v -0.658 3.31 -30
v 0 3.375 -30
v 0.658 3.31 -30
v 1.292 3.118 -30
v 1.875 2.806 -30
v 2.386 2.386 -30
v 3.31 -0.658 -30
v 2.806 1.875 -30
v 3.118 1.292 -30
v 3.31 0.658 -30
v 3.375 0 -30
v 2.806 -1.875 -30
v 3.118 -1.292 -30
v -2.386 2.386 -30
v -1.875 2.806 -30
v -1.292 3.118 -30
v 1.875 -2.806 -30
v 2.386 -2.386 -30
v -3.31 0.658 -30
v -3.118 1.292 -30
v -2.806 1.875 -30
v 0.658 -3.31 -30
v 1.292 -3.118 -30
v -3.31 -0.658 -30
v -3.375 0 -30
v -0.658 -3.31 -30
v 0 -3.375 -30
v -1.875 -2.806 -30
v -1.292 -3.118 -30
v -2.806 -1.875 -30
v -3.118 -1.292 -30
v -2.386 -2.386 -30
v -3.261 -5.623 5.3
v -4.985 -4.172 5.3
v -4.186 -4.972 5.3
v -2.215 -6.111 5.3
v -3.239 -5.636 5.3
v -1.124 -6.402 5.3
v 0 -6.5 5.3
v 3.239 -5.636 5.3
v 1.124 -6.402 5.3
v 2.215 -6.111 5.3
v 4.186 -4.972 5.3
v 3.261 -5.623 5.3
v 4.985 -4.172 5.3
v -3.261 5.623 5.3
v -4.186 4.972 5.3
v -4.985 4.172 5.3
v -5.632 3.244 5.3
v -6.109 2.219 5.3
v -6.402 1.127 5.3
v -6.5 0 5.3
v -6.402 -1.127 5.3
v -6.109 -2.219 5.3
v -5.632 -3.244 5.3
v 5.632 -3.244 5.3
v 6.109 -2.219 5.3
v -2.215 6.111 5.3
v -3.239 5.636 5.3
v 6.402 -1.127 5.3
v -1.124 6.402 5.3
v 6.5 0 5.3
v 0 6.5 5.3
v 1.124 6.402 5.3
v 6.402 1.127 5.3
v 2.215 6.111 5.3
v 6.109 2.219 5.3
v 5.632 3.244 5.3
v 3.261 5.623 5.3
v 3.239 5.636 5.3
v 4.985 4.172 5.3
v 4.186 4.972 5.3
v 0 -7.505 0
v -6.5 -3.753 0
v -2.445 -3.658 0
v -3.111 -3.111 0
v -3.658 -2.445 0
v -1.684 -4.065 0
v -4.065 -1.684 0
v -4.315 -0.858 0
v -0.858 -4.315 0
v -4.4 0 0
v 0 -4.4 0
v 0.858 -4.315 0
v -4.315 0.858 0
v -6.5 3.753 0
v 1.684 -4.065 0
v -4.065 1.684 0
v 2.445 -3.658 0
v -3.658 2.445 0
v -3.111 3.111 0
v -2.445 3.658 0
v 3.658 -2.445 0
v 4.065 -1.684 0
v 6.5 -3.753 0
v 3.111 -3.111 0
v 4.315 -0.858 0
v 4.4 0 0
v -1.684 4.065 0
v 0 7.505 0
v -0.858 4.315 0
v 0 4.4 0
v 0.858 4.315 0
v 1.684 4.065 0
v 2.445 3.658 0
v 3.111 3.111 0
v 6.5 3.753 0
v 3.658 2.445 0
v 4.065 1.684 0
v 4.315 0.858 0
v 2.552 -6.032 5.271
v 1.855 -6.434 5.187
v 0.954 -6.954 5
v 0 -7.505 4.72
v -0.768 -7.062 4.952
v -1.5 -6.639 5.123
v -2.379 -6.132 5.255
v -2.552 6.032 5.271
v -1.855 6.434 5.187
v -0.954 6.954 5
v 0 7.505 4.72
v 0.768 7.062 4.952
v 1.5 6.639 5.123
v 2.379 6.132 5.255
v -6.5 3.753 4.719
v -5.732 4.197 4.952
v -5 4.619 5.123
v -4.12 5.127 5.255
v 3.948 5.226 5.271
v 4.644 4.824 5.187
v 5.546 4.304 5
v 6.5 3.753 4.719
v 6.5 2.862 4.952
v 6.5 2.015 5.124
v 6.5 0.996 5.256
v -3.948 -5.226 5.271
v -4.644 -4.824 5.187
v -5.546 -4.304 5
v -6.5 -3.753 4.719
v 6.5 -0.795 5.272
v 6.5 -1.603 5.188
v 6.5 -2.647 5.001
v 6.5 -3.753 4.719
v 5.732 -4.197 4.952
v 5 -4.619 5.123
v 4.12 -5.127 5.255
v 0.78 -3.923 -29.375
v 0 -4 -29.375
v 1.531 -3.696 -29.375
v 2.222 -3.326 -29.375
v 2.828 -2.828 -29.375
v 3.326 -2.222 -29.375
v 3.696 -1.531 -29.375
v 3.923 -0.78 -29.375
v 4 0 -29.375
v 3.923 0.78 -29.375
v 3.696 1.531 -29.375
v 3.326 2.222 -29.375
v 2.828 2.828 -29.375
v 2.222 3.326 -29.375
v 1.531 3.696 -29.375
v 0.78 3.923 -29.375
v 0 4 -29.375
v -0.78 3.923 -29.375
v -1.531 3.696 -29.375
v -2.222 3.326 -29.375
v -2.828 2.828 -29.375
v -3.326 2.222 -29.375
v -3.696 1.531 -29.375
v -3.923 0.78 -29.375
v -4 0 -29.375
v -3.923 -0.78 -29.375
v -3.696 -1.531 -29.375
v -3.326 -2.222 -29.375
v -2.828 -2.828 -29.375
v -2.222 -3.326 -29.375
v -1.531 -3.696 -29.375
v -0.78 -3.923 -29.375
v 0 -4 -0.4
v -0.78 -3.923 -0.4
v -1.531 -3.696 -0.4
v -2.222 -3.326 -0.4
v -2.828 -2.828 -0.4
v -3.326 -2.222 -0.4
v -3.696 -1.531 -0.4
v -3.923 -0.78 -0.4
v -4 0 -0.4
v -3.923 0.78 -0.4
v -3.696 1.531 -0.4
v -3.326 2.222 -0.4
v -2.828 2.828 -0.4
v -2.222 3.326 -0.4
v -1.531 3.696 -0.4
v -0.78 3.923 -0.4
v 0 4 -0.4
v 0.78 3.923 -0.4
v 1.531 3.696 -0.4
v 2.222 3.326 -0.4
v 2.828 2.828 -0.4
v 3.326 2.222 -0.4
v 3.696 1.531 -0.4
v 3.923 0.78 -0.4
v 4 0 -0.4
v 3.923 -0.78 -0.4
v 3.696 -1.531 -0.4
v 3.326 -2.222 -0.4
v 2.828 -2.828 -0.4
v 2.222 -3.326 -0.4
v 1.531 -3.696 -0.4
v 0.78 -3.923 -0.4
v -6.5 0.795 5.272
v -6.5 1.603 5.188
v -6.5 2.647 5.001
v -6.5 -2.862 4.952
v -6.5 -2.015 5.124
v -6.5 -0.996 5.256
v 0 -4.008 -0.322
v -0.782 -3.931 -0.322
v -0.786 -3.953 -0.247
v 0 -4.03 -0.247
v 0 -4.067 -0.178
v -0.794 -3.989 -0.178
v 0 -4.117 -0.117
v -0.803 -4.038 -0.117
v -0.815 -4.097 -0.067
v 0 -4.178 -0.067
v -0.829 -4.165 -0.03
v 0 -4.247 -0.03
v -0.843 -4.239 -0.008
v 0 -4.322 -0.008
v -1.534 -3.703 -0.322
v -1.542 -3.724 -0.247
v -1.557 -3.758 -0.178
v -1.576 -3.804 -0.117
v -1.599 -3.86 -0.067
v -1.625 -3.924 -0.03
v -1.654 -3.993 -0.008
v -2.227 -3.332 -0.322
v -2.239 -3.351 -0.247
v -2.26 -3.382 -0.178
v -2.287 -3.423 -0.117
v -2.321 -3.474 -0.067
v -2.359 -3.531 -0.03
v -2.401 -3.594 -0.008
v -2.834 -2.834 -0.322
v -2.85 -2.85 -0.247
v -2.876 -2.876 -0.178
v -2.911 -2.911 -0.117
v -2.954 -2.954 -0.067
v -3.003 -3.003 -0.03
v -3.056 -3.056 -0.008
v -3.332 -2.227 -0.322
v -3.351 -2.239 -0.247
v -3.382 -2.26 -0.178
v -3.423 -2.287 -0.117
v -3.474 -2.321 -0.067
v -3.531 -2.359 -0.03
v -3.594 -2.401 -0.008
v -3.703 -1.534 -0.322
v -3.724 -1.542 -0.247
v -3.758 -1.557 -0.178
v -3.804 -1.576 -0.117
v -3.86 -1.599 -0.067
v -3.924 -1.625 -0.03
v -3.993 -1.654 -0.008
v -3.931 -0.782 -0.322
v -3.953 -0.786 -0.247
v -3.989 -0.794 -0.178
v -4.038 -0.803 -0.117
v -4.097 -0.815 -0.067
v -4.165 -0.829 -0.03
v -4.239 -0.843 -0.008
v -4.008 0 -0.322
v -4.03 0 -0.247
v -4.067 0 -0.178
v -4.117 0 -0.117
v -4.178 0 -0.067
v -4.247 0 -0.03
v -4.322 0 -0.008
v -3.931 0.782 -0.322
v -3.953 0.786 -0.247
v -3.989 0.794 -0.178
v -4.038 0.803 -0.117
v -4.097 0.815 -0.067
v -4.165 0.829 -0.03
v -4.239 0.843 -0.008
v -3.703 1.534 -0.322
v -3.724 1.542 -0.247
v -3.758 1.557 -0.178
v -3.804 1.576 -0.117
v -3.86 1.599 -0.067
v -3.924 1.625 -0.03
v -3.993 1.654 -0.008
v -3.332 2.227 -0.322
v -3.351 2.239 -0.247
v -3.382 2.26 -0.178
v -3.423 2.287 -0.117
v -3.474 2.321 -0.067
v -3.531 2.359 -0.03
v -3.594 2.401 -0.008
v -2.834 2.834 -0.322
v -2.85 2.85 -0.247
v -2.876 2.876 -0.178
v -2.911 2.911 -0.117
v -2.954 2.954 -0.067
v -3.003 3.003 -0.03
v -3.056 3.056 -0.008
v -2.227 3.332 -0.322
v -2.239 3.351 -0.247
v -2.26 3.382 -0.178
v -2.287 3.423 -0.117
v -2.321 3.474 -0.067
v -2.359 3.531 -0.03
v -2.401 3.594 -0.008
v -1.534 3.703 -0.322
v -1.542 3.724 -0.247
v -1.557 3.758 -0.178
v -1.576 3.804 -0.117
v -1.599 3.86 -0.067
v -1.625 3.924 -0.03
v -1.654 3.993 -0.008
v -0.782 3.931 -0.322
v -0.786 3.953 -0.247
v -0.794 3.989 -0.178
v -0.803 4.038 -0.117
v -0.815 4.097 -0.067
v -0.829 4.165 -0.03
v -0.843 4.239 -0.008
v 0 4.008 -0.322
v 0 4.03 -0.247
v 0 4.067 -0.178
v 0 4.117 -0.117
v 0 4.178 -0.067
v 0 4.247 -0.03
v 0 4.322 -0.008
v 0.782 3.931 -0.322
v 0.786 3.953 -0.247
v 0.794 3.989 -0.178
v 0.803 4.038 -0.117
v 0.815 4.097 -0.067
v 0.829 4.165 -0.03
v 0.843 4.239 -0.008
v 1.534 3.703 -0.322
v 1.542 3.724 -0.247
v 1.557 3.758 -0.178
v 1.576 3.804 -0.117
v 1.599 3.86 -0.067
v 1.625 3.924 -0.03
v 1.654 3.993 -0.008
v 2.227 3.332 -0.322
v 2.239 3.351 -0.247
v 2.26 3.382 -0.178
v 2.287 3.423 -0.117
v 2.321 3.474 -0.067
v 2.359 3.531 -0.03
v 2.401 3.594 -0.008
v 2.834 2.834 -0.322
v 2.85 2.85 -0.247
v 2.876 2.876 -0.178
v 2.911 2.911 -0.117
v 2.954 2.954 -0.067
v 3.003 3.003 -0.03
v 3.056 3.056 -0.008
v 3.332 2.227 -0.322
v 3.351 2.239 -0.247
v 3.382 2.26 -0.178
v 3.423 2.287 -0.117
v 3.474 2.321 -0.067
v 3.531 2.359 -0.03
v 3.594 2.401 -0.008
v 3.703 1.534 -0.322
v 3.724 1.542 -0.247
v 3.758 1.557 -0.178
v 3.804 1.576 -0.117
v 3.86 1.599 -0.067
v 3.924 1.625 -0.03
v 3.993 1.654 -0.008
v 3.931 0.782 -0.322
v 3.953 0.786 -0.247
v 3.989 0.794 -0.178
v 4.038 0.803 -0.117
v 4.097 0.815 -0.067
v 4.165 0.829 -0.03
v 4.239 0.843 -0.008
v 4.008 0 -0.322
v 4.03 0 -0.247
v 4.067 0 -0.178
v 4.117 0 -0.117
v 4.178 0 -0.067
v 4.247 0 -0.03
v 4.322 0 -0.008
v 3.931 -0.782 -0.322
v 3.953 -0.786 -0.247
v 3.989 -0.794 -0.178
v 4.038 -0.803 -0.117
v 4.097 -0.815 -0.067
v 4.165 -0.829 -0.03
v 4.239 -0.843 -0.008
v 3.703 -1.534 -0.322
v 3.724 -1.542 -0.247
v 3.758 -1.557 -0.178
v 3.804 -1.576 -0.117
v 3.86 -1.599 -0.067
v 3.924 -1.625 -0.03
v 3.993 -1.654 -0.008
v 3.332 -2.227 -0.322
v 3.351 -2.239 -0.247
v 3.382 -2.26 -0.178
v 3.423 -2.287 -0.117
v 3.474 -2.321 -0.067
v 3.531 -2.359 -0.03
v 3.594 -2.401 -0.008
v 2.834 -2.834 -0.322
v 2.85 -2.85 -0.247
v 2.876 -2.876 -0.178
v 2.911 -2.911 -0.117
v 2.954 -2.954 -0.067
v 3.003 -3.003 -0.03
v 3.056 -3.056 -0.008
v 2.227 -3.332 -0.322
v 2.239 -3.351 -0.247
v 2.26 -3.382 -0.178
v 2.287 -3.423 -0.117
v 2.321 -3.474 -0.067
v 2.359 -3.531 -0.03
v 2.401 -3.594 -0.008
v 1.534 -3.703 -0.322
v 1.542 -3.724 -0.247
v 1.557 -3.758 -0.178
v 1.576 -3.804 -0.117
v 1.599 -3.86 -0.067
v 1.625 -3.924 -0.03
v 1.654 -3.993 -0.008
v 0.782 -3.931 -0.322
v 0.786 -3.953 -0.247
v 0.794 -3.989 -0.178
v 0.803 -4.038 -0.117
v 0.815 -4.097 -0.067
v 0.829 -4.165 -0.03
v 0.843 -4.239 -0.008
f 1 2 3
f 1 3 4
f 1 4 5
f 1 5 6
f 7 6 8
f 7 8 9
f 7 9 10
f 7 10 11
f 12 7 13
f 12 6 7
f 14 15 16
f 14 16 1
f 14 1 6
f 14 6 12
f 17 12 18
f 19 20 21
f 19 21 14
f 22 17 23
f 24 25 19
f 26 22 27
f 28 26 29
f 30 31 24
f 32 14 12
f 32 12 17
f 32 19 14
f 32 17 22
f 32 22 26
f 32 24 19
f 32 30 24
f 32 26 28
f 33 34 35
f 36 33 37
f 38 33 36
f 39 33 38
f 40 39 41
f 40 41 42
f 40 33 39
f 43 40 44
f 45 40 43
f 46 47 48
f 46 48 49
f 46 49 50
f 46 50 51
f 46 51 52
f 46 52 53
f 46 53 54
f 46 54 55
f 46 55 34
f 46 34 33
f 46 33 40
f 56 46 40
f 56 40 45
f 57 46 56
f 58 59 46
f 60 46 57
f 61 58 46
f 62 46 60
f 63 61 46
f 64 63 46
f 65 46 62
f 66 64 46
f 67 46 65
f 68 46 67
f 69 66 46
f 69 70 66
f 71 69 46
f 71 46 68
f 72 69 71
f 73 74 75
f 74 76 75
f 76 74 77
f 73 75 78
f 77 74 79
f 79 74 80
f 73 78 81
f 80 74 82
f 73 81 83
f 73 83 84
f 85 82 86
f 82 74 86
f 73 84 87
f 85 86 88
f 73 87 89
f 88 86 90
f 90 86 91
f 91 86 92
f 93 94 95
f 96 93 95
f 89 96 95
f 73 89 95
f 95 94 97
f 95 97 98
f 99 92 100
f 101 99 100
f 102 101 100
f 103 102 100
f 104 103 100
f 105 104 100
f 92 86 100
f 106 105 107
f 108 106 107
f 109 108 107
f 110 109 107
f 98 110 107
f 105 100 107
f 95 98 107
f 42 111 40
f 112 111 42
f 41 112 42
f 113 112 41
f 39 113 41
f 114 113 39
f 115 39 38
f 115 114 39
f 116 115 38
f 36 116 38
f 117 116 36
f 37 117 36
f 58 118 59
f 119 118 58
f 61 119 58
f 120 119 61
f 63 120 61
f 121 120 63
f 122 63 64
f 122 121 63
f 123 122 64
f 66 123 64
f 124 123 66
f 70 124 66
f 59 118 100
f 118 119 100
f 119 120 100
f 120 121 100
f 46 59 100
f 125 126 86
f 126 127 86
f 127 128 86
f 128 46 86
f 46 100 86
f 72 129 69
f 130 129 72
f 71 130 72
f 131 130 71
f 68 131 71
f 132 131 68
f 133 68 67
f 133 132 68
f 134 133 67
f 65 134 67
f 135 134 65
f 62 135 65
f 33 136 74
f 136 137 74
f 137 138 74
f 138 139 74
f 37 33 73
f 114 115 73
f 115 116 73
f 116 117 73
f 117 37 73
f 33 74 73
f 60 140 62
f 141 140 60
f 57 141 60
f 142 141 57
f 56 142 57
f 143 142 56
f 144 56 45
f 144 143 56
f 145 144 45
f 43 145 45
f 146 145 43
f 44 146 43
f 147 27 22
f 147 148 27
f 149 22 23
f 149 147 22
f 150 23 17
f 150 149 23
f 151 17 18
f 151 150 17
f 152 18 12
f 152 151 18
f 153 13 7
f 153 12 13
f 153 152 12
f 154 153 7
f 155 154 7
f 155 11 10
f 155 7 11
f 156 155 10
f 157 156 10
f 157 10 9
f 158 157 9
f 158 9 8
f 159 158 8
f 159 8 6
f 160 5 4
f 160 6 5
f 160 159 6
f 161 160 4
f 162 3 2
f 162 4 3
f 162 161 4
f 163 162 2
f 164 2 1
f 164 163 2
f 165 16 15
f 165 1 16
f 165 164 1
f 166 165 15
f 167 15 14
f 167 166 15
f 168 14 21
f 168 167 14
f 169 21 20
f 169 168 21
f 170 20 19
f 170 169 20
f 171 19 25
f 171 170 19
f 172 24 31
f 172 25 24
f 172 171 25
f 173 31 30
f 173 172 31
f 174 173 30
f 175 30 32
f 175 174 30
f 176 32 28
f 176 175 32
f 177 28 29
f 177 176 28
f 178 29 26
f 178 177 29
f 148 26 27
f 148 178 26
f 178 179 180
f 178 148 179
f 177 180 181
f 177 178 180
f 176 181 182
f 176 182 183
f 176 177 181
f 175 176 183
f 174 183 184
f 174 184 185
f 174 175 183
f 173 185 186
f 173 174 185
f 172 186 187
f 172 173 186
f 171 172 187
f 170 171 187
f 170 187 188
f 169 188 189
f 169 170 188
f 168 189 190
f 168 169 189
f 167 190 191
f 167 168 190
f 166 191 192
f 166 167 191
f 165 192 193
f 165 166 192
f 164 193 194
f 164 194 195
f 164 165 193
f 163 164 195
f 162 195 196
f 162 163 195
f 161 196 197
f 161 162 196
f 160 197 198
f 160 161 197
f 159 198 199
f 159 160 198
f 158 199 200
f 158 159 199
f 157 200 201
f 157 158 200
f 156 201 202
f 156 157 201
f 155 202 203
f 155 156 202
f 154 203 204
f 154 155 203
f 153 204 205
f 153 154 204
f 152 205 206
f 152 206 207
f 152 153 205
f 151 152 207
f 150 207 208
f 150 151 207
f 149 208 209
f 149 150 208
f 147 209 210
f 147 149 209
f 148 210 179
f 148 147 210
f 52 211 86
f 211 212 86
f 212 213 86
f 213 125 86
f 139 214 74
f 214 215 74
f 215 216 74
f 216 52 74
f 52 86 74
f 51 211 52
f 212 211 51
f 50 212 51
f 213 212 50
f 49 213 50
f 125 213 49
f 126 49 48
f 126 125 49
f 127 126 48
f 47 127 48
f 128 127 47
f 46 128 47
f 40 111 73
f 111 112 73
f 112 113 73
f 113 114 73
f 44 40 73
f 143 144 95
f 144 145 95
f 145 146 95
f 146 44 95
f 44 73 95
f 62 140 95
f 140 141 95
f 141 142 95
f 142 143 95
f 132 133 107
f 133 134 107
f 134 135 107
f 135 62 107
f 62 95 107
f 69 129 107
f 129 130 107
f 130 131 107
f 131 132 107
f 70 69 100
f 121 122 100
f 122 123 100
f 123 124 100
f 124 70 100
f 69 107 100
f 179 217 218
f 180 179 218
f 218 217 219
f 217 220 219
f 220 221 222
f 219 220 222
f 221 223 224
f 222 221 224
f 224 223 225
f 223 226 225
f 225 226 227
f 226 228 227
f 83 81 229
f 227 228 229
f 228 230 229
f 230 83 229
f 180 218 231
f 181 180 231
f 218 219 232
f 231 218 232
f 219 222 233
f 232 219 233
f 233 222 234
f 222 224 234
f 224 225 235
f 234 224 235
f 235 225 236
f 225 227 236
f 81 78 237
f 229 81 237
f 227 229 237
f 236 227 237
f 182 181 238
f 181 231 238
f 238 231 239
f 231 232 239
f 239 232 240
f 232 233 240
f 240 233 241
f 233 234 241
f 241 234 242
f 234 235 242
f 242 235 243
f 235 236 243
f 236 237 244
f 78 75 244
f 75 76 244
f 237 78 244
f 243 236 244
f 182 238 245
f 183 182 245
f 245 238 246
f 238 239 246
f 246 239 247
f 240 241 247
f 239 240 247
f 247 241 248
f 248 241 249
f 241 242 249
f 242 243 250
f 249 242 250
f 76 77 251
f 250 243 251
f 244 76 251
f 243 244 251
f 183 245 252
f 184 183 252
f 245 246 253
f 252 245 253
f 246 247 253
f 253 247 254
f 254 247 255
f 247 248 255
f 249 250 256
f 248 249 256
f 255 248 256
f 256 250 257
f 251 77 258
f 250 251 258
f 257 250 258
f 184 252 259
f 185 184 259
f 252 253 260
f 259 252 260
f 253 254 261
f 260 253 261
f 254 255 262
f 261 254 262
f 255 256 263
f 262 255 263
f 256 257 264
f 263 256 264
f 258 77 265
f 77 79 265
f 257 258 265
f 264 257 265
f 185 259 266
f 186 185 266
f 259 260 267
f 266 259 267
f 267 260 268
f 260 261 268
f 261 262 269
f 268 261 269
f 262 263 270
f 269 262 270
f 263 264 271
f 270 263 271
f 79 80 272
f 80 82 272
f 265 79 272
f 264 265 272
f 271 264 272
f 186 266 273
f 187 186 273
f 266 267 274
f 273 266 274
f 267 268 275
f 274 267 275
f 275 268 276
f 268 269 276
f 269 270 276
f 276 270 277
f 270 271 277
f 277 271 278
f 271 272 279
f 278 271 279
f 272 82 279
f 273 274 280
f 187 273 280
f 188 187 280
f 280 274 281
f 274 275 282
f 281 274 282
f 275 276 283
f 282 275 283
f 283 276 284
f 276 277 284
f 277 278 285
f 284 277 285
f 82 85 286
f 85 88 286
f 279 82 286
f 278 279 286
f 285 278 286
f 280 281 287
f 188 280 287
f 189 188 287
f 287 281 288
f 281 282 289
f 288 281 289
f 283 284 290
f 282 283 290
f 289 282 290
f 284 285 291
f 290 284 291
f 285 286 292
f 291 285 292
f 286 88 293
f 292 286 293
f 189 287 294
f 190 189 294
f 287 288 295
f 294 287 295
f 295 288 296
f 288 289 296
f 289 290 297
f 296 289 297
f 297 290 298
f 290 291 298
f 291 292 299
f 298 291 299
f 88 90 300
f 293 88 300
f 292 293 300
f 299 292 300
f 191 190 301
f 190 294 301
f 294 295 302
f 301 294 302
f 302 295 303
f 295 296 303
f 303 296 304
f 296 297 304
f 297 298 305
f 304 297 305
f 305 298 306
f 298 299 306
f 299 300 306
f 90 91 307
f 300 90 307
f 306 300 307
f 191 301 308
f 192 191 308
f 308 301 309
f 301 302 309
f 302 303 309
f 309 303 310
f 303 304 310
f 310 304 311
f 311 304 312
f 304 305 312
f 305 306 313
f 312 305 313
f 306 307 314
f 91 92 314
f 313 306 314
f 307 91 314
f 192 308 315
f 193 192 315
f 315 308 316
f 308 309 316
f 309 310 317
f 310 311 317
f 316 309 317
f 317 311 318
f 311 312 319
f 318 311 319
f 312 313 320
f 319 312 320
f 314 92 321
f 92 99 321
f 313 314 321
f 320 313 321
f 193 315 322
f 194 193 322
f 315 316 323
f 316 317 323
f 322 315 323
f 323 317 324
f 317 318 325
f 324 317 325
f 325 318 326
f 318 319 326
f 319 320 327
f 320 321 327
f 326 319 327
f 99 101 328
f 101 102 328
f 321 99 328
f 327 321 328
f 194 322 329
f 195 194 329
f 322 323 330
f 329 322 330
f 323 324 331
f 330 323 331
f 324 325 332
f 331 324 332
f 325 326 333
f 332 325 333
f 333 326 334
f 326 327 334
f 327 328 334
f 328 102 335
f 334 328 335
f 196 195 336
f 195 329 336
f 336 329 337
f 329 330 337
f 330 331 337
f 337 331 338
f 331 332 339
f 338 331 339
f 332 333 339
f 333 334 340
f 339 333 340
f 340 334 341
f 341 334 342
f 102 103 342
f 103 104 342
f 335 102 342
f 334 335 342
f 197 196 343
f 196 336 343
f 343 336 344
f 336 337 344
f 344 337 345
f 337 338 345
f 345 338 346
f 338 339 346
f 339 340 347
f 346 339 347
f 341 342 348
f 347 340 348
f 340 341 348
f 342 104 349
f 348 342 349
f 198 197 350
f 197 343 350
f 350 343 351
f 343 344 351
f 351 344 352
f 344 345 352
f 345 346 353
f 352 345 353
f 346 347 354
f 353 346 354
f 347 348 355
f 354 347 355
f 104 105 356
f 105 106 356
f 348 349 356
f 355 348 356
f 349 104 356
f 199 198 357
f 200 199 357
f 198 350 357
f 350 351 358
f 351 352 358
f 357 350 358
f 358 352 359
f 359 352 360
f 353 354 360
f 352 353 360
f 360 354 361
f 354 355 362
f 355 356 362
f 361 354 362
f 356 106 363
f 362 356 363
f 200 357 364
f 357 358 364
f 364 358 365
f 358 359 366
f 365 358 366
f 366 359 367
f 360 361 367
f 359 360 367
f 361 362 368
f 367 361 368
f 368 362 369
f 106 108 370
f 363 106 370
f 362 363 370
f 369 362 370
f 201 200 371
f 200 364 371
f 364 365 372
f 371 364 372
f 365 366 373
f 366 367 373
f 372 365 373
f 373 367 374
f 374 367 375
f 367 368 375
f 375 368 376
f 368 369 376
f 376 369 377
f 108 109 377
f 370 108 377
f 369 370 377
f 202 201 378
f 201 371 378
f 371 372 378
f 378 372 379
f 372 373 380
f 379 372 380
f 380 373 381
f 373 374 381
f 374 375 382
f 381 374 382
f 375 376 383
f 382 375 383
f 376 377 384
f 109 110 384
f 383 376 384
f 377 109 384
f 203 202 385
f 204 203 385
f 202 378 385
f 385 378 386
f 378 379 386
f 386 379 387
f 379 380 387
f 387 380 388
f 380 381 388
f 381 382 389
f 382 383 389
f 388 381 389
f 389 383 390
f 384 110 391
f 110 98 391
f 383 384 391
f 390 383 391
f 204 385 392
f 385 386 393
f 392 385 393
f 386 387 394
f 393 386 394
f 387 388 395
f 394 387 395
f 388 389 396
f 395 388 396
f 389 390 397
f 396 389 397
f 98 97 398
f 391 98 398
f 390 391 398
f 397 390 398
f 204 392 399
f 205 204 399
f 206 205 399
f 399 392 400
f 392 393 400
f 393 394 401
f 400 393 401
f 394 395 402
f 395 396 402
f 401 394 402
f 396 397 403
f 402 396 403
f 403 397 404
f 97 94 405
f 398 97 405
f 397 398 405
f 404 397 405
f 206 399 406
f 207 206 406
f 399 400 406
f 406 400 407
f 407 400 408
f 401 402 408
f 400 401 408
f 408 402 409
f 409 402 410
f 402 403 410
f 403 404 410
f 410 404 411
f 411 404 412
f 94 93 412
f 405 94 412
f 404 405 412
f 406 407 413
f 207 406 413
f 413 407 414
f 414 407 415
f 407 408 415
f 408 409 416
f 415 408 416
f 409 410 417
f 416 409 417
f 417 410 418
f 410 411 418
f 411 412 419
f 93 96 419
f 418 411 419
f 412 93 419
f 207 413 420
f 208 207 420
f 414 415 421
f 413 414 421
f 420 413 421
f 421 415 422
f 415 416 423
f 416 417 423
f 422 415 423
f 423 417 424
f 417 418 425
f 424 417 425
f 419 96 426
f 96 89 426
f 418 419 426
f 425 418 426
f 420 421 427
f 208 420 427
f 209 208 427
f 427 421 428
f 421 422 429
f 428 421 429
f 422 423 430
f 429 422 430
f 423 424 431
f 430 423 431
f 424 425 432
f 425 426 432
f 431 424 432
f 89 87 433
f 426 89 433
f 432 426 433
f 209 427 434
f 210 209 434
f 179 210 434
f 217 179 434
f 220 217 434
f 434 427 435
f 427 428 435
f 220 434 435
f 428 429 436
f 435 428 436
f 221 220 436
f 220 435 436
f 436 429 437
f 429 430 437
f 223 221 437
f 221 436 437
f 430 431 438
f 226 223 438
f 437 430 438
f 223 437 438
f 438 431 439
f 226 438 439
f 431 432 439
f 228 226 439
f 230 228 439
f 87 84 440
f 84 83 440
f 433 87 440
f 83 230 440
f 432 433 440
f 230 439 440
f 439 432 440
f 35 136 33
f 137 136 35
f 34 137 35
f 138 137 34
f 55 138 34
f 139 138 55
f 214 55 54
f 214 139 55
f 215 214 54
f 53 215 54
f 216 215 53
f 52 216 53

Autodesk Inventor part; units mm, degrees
ref_plane "WorkPlane1" through (0, 0, 0) normal (0, 0, 1) x (1, 0, 0)
sketch "Sketch1" plane through (0, 0, 0) normal (0, 0, 1) x (1, 0, 0)
  point P0 (0, 0)
sketch "Sketch2" plane through (0, 0, 0) normal (0, 0, 1) x (1, 0, 0)
  line L0 (-6.5, 3.7529) -> (-6.5, -3.7529)
  line L1 (0, 7.5054) -> (-6.5, 3.7529)
  line L2 (6.5, 3.7529) -> (0, 7.5054)
  line L3 (6.5, -3.7529) -> (6.5, 3.7529)
  line L4 (0, -7.5054) -> (6.5, -3.7529)
  line L5 (-6.5, -3.7529) -> (0, -7.5054)
  circle A0 centre (0, 0) radius 6.5 construction
  dimension "d1" = 13
  dimension "d29" = 0
  dimension "d30" = 0
extrude "Extrusion1" add sketch "Sketch2" along normal blind 5.3
sketch "Sketch3" plane through (0, 0, 0) normal (1, 0, 0) x (0, 1, 0)
  line L0 (6.5, 5.3) -> (7.6054, 5.3)
  line L1 (7.6054, 4.6618) -> (6.5, 5.3)
  line L2 (7.6054, 5.3) -> (7.6054, 4.6618)
  line L3 (0, -1.06) -> (0, 6.36) projected
  line L4 (7.5054, 0) -> (7.5054, 5.3) projected
  dimension "d25" = 0.1
  dimension "d26" = 0
  dimension "d27" = 60
  dimension "d28" = 6.5
revolve "Revolution1" cut sketch "Sketch3" angle 360 about axis through (0, 0, -10) along (0, 0, 1)
sketch "Sketch4" plane through (0, 0, 0) normal (1, 0, 0) x (0, 1, 0)
  line L0 (0, -30) -> (0, 0)
  line L1 (-4, -30) -> (0, -30)
  line L2 (-4, 0) -> (-4, -30)
  line L3 (0, 0) -> (-4, 0)
  line L4 (0, -30) -> (0, 0)
  line L5 (-4.8, 0) -> (0.8, 0) projected
  line L6 (0, -36) -> (0, 6) projected
  dimension "d18" = 4
  dimension "d20" = 30
  dimension "d33" = 0
  dimension "d34" = 0
revolve "Revolution2" add sketch "Sketch4" angle 360 about axis through (0, 0, -30) along (0, 0, -1)
chamfer "Chamfer1" distance 0.625 angle 45 1 edges at (0, 4, -30)
fillet "Fillet1" radius 0.4 1 edges at (0, 4, 0)
thread "Thread1" size "M8x1.25" class "6g" standard "ISO Metric profile" length 27.5
ref_plane "MSC_PF1" through (0, 0, 0) normal (1, 0, 0) x (0, 1, 0)
ref_plane "MSC_PT1" through (0, 0, 0) normal (0, 0, -1) x (-1, 0, 0)
equation "\"d22\" = 0.5 * PTC"
equation "\"d23\" = 0.5 * PTC"
equation "\"d24\" = r"
equation "\"d1\" = ParS"
equation "\"d6\" = ParK"
equation "\"b\" = NLG - 2 * PTC"
equation "\"d28\" = 0.5 * ParS"
equation "\"d18\" = 0.5 * NND"
equation "\"d20\" = NLG"
equation "\"NND\" = 8"
equation "\"NLG\" = 30"
equation "\"PTC\" = 1.25"
equation "\"ParK\" = 5.3"
equation "\"ParS\" = 13"
equation "\"msp_es\" = 0.577367 * ParS"
equation "\"r\" = 0.4"
equation "\"THREADDIA\" = NND"
properties part number "ISO 4018 - M8 x 30" material "Steel"
